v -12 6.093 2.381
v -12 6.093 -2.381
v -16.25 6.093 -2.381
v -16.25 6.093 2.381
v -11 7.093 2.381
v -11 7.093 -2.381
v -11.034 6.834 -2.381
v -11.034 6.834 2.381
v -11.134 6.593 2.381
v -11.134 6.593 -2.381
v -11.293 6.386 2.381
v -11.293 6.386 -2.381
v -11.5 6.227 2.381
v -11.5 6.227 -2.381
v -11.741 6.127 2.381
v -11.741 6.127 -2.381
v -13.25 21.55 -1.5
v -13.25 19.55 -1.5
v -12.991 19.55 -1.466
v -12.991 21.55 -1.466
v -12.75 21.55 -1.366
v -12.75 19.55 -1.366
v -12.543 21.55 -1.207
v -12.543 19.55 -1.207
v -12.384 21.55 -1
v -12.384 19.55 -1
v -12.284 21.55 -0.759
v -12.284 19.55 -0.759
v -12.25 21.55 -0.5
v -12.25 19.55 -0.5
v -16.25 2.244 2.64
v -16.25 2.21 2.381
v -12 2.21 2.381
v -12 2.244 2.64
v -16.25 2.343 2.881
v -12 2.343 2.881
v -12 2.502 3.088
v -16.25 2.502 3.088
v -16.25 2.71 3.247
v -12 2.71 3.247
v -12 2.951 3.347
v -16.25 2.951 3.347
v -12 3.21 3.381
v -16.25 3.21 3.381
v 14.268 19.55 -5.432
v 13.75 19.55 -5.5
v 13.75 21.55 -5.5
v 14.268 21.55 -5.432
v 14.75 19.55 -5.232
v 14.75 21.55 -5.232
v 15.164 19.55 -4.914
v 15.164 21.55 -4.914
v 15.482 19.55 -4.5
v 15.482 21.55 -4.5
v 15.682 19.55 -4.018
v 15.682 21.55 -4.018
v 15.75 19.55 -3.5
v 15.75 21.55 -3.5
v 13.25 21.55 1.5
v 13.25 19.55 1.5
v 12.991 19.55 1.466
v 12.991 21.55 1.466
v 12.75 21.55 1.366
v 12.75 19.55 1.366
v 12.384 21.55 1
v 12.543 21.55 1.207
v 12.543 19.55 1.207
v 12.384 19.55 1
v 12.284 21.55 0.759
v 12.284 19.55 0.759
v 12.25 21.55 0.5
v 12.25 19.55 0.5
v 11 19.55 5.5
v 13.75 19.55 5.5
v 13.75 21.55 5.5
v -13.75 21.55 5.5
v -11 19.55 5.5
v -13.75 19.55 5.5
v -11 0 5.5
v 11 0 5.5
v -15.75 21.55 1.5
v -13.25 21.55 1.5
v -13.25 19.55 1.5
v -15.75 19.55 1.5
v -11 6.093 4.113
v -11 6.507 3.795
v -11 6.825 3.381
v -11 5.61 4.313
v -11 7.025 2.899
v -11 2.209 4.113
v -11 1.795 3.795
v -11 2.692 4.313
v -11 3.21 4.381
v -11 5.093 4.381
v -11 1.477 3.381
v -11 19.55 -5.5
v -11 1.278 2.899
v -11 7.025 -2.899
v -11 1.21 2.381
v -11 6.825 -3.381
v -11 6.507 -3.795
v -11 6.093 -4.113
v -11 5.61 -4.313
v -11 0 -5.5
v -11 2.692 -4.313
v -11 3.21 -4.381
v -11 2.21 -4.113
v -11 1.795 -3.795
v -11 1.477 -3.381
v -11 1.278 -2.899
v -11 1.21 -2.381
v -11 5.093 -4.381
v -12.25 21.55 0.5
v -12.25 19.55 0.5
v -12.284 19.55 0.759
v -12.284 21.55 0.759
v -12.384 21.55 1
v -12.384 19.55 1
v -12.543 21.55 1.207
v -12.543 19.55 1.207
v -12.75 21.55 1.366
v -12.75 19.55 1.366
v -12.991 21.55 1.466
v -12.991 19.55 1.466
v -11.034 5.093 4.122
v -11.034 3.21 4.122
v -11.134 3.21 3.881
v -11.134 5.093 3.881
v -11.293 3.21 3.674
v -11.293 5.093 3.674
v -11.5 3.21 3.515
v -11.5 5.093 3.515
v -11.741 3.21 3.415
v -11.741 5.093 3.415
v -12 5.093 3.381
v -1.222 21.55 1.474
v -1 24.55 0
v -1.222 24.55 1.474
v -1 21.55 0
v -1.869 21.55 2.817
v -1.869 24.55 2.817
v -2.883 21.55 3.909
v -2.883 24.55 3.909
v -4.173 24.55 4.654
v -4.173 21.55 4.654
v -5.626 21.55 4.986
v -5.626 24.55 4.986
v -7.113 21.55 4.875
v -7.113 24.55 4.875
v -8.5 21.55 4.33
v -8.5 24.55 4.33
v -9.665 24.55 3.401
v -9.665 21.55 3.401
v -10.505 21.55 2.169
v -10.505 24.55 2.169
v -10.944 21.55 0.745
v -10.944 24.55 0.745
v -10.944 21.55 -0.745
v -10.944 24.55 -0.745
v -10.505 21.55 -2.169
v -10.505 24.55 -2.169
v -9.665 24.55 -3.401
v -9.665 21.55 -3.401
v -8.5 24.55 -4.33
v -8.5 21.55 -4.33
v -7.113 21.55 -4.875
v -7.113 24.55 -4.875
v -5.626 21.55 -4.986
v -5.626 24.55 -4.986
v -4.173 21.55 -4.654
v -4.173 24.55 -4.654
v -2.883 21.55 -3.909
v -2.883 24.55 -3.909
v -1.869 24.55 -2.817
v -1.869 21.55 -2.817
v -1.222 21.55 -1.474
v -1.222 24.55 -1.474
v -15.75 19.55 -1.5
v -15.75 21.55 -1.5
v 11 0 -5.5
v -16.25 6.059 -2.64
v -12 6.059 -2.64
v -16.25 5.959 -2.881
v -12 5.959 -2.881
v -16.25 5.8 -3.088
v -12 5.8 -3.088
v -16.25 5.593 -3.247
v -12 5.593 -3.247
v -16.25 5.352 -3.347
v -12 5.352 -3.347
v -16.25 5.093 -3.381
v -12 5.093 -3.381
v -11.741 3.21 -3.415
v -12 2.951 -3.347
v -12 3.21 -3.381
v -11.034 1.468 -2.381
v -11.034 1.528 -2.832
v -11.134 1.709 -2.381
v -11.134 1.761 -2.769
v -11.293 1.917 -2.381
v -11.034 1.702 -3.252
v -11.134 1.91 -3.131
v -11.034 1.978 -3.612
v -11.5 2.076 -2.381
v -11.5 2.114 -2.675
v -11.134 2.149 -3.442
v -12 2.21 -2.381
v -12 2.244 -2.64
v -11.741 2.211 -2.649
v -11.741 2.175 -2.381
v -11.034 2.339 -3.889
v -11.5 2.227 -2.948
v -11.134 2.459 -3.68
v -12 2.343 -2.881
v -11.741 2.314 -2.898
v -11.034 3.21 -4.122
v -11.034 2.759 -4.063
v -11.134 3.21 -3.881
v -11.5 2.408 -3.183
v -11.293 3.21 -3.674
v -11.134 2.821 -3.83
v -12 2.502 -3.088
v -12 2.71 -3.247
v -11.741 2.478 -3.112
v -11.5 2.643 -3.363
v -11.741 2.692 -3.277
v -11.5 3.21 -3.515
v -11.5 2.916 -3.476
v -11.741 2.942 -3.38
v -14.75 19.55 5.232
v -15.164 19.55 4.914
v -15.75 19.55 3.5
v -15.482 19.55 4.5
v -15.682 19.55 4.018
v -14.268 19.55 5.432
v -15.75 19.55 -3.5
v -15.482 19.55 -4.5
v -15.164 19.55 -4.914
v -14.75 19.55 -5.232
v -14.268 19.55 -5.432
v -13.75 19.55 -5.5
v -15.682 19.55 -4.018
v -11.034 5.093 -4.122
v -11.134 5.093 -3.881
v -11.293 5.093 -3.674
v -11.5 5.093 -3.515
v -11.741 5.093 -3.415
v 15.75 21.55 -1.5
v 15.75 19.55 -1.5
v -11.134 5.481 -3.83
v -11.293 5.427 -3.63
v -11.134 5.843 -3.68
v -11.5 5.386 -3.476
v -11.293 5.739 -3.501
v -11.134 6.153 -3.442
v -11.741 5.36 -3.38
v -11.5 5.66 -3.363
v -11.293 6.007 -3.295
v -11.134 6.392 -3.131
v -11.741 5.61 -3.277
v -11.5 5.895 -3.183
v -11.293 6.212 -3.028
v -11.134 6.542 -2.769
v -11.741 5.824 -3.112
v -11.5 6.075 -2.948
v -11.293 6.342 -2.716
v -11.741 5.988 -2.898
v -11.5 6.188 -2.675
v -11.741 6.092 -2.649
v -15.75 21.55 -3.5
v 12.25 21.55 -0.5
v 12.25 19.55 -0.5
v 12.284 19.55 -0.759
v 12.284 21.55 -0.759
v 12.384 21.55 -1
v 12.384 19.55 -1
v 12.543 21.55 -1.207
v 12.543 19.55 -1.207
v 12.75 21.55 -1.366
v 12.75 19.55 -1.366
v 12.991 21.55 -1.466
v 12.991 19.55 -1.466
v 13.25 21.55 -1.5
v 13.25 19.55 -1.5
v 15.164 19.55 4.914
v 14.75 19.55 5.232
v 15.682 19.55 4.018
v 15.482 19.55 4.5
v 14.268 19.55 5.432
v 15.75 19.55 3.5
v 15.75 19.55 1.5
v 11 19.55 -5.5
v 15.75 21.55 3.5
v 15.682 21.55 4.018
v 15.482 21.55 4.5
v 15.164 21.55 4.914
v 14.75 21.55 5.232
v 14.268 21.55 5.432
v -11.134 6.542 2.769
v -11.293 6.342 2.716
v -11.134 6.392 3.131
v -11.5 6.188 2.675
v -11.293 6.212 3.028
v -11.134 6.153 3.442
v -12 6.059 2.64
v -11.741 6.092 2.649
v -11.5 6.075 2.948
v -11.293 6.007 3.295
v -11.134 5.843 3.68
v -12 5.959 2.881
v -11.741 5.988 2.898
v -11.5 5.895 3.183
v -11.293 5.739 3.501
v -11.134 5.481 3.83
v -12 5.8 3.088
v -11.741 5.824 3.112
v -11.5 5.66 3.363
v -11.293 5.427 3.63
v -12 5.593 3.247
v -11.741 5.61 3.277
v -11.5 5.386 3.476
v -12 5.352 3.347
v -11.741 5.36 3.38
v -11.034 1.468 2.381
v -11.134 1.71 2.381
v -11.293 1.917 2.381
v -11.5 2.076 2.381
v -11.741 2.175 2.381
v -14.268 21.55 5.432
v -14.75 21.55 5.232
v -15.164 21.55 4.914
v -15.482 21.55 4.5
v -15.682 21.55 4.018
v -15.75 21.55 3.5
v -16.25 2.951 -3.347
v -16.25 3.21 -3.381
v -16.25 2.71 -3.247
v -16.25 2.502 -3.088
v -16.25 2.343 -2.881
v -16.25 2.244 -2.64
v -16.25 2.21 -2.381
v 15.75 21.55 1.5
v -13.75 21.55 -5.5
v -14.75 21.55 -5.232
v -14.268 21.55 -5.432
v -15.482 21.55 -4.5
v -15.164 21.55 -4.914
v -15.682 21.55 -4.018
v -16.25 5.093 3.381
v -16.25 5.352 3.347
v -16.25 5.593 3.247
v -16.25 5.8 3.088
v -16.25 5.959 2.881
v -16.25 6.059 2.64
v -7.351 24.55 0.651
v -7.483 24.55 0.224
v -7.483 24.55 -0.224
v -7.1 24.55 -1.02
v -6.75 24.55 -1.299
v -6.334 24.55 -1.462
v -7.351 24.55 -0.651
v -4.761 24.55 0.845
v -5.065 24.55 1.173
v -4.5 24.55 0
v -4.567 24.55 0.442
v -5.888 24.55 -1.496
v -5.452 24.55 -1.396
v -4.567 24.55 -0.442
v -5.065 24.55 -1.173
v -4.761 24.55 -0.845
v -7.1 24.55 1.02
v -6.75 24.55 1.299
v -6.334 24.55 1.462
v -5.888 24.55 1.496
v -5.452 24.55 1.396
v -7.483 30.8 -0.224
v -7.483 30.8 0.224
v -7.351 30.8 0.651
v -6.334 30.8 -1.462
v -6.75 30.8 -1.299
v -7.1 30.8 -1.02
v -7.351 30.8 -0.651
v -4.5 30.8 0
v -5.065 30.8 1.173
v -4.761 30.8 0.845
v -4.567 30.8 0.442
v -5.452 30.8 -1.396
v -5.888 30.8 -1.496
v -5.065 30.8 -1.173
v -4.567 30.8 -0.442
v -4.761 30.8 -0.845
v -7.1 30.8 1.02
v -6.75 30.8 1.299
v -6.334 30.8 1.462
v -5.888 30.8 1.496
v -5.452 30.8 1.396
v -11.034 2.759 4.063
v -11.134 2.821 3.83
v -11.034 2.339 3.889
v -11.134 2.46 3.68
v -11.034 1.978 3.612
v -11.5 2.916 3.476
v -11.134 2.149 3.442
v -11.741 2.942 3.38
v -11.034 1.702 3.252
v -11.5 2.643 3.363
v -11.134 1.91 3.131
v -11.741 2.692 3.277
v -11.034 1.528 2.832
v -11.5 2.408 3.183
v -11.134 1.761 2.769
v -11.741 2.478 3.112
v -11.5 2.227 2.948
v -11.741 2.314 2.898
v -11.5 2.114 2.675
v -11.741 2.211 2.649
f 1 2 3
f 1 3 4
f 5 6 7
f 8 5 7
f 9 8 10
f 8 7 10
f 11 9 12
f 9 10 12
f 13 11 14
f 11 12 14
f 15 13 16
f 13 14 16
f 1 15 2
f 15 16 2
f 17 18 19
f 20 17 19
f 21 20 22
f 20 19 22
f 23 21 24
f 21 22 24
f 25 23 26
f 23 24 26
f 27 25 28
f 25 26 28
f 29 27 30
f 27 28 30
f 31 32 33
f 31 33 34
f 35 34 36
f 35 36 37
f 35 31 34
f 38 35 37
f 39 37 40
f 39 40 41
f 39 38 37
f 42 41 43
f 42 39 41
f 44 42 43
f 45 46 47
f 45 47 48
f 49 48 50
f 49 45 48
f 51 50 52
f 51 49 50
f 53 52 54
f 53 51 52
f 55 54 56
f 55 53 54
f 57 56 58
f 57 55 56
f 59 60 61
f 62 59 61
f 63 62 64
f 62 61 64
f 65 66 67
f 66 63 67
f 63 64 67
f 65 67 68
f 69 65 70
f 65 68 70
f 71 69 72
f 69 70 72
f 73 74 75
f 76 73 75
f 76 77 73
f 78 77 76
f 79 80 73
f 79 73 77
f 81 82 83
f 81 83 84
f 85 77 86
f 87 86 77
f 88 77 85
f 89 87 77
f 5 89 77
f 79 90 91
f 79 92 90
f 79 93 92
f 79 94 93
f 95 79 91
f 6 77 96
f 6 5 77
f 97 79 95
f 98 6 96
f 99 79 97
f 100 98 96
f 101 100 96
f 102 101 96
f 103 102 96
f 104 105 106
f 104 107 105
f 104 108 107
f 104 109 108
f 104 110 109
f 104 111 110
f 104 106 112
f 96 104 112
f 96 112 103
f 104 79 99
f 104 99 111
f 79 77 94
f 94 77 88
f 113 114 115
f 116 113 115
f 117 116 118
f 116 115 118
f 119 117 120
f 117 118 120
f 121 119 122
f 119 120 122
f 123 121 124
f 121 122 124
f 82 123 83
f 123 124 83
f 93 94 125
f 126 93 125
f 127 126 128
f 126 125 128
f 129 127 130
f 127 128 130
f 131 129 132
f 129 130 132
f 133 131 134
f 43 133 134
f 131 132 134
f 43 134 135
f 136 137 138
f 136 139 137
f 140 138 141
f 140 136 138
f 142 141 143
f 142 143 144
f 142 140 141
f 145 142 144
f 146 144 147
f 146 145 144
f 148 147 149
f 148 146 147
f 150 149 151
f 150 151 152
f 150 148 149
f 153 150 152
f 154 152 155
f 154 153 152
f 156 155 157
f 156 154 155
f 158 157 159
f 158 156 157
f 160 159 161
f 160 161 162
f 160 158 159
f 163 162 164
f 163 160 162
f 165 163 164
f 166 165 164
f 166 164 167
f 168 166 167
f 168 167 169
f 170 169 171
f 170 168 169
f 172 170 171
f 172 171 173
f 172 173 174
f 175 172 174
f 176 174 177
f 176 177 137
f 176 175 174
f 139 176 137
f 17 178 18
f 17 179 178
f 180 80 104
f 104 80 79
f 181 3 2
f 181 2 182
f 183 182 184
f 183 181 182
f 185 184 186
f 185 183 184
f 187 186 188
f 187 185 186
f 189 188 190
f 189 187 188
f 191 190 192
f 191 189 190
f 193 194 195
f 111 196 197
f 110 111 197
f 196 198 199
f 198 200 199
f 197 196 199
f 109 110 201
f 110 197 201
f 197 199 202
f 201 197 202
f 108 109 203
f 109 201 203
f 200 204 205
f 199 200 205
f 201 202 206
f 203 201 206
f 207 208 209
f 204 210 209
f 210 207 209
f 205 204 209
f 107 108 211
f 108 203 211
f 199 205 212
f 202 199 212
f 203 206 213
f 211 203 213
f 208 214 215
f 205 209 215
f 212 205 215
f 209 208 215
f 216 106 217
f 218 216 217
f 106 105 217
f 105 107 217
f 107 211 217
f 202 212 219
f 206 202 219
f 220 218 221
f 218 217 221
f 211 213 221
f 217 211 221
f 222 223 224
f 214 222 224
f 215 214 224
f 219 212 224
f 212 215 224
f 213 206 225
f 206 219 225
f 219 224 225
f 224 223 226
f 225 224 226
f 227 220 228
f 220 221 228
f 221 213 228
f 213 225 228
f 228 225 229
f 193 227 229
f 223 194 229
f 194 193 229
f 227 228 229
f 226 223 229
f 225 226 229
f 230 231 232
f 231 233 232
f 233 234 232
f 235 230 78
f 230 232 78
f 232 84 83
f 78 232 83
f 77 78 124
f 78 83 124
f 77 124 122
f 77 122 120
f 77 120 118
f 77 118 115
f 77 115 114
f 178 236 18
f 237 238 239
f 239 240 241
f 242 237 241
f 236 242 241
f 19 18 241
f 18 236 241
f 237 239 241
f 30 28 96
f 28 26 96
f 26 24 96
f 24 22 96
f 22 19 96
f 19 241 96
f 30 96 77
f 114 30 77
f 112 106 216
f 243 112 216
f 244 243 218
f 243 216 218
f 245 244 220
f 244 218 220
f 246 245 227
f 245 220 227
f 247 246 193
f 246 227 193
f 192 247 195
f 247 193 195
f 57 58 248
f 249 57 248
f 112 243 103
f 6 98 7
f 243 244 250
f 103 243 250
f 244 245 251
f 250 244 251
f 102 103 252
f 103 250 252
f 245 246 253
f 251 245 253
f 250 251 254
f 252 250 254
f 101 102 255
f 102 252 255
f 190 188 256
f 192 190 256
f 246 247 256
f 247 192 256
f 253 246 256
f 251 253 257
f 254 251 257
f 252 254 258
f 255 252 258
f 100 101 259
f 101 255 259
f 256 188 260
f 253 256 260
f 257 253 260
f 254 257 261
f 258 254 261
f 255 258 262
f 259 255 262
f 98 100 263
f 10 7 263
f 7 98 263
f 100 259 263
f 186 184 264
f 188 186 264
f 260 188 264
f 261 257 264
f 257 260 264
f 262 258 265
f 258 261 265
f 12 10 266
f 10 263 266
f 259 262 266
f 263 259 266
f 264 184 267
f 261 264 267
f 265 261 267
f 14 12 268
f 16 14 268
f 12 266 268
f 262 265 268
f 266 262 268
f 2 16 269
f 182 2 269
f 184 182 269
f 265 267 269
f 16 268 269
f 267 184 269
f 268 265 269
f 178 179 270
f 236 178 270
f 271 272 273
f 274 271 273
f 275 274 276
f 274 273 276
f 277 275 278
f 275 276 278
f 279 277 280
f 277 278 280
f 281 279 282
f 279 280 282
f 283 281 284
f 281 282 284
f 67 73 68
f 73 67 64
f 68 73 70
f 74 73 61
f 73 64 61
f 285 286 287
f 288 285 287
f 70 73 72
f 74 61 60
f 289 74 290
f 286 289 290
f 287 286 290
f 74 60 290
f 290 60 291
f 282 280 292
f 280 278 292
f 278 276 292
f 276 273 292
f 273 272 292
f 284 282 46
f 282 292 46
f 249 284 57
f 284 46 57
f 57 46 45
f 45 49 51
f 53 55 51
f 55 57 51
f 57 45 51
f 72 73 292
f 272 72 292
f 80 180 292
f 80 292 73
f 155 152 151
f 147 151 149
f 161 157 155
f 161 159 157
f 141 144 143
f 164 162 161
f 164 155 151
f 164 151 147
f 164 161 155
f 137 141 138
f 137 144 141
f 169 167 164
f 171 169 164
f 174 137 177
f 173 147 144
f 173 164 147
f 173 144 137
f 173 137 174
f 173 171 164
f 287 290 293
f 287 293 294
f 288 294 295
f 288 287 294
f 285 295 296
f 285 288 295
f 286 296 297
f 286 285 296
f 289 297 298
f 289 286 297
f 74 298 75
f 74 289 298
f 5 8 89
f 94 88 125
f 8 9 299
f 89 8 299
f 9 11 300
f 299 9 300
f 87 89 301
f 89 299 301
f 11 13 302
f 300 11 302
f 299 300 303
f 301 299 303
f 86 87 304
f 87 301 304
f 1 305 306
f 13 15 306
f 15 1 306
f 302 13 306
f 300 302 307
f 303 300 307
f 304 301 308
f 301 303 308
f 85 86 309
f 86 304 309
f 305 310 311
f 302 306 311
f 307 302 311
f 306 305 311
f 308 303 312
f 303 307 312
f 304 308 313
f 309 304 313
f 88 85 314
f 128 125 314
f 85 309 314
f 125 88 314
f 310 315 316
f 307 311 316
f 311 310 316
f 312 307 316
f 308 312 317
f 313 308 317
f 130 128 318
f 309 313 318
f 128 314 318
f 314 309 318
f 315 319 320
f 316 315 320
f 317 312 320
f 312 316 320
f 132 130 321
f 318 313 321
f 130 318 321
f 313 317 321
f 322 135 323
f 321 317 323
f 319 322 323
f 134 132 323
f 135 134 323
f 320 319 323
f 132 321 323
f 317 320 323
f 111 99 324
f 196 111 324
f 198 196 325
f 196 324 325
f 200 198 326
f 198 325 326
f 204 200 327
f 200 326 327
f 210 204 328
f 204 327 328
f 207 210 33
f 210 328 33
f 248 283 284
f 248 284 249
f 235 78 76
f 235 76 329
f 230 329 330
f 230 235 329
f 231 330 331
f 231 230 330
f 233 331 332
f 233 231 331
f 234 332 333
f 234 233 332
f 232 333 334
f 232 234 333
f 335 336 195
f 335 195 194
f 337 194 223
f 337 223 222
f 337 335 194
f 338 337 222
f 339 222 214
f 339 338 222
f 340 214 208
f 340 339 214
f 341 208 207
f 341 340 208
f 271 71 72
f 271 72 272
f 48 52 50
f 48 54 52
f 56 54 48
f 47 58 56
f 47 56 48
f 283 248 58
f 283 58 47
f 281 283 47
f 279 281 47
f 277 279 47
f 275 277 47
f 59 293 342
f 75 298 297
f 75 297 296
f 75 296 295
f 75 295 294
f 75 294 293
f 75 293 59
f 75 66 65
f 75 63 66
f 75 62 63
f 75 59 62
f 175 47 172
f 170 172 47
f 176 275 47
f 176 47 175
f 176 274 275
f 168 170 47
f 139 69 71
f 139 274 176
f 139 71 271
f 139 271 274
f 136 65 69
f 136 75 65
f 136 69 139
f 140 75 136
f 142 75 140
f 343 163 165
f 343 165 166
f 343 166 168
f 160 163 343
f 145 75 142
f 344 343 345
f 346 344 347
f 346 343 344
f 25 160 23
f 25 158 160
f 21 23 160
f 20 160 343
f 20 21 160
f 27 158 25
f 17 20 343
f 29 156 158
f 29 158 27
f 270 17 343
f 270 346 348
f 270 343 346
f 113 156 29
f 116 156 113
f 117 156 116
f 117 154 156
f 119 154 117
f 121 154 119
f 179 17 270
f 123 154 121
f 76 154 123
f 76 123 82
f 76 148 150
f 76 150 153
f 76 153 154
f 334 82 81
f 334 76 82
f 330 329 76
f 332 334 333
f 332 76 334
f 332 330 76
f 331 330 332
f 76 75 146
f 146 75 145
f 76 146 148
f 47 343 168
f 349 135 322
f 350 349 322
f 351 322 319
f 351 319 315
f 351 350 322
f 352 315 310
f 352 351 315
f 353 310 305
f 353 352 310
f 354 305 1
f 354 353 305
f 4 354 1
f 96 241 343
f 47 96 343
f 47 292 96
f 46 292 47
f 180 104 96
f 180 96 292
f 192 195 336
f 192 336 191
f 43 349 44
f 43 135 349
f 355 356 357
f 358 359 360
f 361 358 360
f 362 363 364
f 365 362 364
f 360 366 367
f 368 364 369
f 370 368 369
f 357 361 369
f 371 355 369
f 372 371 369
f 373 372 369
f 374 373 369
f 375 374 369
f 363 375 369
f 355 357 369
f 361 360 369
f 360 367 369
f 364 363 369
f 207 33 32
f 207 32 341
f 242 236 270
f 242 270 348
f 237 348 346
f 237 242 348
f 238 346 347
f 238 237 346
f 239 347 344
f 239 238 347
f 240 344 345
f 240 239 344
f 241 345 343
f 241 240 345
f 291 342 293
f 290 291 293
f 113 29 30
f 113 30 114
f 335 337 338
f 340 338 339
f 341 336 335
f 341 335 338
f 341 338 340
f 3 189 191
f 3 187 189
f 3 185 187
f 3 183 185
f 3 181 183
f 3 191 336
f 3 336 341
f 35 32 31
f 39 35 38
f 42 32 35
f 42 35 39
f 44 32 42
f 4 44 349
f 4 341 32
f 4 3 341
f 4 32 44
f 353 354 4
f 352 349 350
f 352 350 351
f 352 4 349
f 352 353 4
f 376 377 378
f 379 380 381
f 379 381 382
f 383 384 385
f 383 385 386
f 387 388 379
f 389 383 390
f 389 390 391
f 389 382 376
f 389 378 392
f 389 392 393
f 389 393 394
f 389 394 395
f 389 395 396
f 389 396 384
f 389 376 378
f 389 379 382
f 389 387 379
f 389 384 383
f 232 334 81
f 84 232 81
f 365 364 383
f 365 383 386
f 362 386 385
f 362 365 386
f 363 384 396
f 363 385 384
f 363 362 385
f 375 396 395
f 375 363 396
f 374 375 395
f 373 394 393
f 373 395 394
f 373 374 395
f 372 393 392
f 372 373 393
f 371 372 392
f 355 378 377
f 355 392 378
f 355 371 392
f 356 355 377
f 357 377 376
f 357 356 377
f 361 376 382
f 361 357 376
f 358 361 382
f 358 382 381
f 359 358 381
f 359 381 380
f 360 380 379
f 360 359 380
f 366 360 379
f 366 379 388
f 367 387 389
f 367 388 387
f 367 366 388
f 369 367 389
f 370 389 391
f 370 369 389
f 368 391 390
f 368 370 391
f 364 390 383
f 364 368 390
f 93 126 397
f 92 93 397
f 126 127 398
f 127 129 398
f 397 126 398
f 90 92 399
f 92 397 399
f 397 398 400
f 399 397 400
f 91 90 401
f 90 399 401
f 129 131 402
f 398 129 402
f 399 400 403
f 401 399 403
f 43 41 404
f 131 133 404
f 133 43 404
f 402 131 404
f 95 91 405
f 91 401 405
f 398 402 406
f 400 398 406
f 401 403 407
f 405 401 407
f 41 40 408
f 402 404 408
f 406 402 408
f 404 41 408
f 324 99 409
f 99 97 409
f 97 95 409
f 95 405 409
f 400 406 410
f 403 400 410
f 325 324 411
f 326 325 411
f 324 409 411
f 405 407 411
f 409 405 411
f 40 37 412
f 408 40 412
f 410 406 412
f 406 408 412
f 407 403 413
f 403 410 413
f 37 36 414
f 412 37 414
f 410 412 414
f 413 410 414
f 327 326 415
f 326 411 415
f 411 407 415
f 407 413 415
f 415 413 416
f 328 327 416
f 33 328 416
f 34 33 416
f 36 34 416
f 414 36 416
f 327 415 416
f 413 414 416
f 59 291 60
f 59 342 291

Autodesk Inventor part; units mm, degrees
ref_plane "YZ Plane" through (0, 0, 0) normal (1, 0, 0) x (0, 1, 0)
ref_plane "XZ Plane" through (0, 0, 0) normal (0, 1, 0) x (-1, 0, 0)
ref_plane "XY Plane" through (0, 0, 0) normal (0, 0, 1) x (1, 0, 0)
sketch "Skizze1" plane through (0, 0, 0) normal (0, 1, 0) x (-1, 0, 0)
  line L0 (-11, 5.5) -> (11, 5.5)
  line L1 (11, 5.5) -> (11, -5.5)
  line L2 (11, -5.5) -> (-11, -5.5)
  line L3 (-11, -5.5) -> (-11, 5.5)
  line L4 (-11, 5.5) -> (11, -5.5) construction
  line L5 (11, 5.5) -> (-11, -5.5) construction
  point P0 (0, 0)
  dimension "d0" = 22
  dimension "d1" = 11
extrude "Extrusion1" add sketch "Skizze1" along normal blind 21.55
sketch "Skizze2" plane through (0, 21.55, 0) normal (0, 1, 0) x (1, 0, 0)
  line L0 (15.75, -5.5) -> (-15.75, -5.5)
  line L1 (-15.75, -5.5) -> (-15.75, 5.5)
  line L2 (-15.75, 5.5) -> (15.75, 5.5)
  line L3 (15.75, 5.5) -> (15.75, -5.5)
  line L4 (15.75, -5.5) -> (-15.75, 5.5) construction
  line L5 (-15.75, -5.5) -> (15.75, 5.5) construction
  line L6 (11, 5.5) -> (-11, 5.5) projected
  point P0 (0, 0)
  dimension "d4" = 31.5
extrude "Extrusion2" add sketch "Skizze2" against normal blind 2
fillet "Rundung1" radius 2 4 edges at (-15.75, 20.55, 5.5) (15.75, 20.55, 5.5) (15.75, 20.55, -5.5) (-15.75, 20.55, -5.5)
sketch "Skizze3" plane through (0, 21.55, 0) normal (0, 1, 0) x (1, 0, 0)
  circle A0 centre (-6, 0) radius 5
  line L0 (-11, -5.5) -> (-11, 5.5) projected
  point P0 (0, 0)
  dimension "d8" = 5
  dimension "d9" = 10
extrude "Extrusion3" add sketch "Skizze3" along normal blind 3
sketch "Skizze4" plane through (-6, 24.55, 0) normal (0, 1, 0) x (1, 0, 0)
  circle A0 centre (0, 0) radius 1.5
  circle A1 centre (0, 0) radius 5 projected
  point P0 (6, 0)
  dimension "d12" = 3
extrude "Extrusion4" add sketch "Skizze4" along normal blind 6.25 separate body contours A0
sketch "Skizze5" plane through (0, 21.55, 0) normal (0, 1, 0) x (1, 0, 0)
  line L0 (19.25, -1.5) -> (12.25, -1.5)
  line L1 (12.25, -1.5) -> (12.25, 1.5)
  line L2 (12.25, 1.5) -> (19.25, 1.5)
  line L3 (19.25, 1.5) -> (19.25, -1.5)
  line L4 (15.75, -3.5) -> (15.75, 3.5) projected
  line L5 (19.25, -1.5) -> (12.25, 1.5) construction
  line L6 (12.25, -1.5) -> (19.25, 1.5) construction
  line L7 (-12.25, -1.5) -> (-19.25, -1.5)
  line L8 (-19.25, -1.5) -> (-19.25, 1.5)
  line L9 (-19.25, 1.5) -> (-12.25, 1.5)
  line L10 (-12.25, 1.5) -> (-12.25, -1.5)
  line L11 (-15.75, -3.5) -> (-15.75, 3.5) projected
  line L12 (-12.25, -1.5) -> (-19.25, 1.5) construction
  line L13 (-19.25, -1.5) -> (-12.25, 1.5) construction
  point P0 (0, 0)
  point P1 (15.75, 0)
  point P2 (-15.75, 0)
  dimension "d15" = 3
  dimension "d16" = 3
  dimension "d17" = 3.5
  dimension "d18" = 3.5
extrude "Extrusion5" cut sketch "Skizze5" against normal blind 5.25 bodies 1
fillet "Rundung2" radius 1 4 edges at (-12.25, 20.55, 1.5) (-12.25, 20.55, -1.5) (12.25, 20.55, 1.5) (12.25, 20.55, -1.5)
sketch "Skizze6" plane through (-11, 0, -5.5) normal (-1, 0, 0) x (0, 0, 1)
  line L0 (2.1189, 6.0927) -> (8.8811, 6.0927)
  line L1 (8.8811, 6.0927) -> (8.8811, 2.2095)
  line L2 (8.8811, 2.2095) -> (2.1189, 2.2095)
  line L3 (2.1189, 2.2095) -> (2.1189, 6.0927)
  line L4 (2.1189, 6.0927) -> (8.8811, 2.2095) construction
  line L5 (8.8811, 6.0927) -> (2.1189, 2.2095) construction
  point P0 (5.5, 0)
  point P1 (5.5, 4.1511)
extrude "Extrusion6" add sketch "Skizze6" along normal blind 5.25 bodies 1
fillet "Rundung3" radius 1 4 edges at (-13.625, 6.0927, -3.3811) (-13.625, 2.2095, -3.3811) (-13.625, 2.2095, 3.3811) (-13.625, 6.0927, 3.3811)
fillet "Rundung4" radius 1 8 edges at (-11, 5.7998, 3.0882) (-11, 4.1511, 3.3811) (-11, 2.5023, 3.0882) (-11, 2.2095, 0) (-11, 2.5023, -3.0882) (-11, 4.1511, -3.3811) (-11, 5.7998, -3.0882) (-11, 6.0927, 0)
properties part number "P_Servo_SIMPROP"
